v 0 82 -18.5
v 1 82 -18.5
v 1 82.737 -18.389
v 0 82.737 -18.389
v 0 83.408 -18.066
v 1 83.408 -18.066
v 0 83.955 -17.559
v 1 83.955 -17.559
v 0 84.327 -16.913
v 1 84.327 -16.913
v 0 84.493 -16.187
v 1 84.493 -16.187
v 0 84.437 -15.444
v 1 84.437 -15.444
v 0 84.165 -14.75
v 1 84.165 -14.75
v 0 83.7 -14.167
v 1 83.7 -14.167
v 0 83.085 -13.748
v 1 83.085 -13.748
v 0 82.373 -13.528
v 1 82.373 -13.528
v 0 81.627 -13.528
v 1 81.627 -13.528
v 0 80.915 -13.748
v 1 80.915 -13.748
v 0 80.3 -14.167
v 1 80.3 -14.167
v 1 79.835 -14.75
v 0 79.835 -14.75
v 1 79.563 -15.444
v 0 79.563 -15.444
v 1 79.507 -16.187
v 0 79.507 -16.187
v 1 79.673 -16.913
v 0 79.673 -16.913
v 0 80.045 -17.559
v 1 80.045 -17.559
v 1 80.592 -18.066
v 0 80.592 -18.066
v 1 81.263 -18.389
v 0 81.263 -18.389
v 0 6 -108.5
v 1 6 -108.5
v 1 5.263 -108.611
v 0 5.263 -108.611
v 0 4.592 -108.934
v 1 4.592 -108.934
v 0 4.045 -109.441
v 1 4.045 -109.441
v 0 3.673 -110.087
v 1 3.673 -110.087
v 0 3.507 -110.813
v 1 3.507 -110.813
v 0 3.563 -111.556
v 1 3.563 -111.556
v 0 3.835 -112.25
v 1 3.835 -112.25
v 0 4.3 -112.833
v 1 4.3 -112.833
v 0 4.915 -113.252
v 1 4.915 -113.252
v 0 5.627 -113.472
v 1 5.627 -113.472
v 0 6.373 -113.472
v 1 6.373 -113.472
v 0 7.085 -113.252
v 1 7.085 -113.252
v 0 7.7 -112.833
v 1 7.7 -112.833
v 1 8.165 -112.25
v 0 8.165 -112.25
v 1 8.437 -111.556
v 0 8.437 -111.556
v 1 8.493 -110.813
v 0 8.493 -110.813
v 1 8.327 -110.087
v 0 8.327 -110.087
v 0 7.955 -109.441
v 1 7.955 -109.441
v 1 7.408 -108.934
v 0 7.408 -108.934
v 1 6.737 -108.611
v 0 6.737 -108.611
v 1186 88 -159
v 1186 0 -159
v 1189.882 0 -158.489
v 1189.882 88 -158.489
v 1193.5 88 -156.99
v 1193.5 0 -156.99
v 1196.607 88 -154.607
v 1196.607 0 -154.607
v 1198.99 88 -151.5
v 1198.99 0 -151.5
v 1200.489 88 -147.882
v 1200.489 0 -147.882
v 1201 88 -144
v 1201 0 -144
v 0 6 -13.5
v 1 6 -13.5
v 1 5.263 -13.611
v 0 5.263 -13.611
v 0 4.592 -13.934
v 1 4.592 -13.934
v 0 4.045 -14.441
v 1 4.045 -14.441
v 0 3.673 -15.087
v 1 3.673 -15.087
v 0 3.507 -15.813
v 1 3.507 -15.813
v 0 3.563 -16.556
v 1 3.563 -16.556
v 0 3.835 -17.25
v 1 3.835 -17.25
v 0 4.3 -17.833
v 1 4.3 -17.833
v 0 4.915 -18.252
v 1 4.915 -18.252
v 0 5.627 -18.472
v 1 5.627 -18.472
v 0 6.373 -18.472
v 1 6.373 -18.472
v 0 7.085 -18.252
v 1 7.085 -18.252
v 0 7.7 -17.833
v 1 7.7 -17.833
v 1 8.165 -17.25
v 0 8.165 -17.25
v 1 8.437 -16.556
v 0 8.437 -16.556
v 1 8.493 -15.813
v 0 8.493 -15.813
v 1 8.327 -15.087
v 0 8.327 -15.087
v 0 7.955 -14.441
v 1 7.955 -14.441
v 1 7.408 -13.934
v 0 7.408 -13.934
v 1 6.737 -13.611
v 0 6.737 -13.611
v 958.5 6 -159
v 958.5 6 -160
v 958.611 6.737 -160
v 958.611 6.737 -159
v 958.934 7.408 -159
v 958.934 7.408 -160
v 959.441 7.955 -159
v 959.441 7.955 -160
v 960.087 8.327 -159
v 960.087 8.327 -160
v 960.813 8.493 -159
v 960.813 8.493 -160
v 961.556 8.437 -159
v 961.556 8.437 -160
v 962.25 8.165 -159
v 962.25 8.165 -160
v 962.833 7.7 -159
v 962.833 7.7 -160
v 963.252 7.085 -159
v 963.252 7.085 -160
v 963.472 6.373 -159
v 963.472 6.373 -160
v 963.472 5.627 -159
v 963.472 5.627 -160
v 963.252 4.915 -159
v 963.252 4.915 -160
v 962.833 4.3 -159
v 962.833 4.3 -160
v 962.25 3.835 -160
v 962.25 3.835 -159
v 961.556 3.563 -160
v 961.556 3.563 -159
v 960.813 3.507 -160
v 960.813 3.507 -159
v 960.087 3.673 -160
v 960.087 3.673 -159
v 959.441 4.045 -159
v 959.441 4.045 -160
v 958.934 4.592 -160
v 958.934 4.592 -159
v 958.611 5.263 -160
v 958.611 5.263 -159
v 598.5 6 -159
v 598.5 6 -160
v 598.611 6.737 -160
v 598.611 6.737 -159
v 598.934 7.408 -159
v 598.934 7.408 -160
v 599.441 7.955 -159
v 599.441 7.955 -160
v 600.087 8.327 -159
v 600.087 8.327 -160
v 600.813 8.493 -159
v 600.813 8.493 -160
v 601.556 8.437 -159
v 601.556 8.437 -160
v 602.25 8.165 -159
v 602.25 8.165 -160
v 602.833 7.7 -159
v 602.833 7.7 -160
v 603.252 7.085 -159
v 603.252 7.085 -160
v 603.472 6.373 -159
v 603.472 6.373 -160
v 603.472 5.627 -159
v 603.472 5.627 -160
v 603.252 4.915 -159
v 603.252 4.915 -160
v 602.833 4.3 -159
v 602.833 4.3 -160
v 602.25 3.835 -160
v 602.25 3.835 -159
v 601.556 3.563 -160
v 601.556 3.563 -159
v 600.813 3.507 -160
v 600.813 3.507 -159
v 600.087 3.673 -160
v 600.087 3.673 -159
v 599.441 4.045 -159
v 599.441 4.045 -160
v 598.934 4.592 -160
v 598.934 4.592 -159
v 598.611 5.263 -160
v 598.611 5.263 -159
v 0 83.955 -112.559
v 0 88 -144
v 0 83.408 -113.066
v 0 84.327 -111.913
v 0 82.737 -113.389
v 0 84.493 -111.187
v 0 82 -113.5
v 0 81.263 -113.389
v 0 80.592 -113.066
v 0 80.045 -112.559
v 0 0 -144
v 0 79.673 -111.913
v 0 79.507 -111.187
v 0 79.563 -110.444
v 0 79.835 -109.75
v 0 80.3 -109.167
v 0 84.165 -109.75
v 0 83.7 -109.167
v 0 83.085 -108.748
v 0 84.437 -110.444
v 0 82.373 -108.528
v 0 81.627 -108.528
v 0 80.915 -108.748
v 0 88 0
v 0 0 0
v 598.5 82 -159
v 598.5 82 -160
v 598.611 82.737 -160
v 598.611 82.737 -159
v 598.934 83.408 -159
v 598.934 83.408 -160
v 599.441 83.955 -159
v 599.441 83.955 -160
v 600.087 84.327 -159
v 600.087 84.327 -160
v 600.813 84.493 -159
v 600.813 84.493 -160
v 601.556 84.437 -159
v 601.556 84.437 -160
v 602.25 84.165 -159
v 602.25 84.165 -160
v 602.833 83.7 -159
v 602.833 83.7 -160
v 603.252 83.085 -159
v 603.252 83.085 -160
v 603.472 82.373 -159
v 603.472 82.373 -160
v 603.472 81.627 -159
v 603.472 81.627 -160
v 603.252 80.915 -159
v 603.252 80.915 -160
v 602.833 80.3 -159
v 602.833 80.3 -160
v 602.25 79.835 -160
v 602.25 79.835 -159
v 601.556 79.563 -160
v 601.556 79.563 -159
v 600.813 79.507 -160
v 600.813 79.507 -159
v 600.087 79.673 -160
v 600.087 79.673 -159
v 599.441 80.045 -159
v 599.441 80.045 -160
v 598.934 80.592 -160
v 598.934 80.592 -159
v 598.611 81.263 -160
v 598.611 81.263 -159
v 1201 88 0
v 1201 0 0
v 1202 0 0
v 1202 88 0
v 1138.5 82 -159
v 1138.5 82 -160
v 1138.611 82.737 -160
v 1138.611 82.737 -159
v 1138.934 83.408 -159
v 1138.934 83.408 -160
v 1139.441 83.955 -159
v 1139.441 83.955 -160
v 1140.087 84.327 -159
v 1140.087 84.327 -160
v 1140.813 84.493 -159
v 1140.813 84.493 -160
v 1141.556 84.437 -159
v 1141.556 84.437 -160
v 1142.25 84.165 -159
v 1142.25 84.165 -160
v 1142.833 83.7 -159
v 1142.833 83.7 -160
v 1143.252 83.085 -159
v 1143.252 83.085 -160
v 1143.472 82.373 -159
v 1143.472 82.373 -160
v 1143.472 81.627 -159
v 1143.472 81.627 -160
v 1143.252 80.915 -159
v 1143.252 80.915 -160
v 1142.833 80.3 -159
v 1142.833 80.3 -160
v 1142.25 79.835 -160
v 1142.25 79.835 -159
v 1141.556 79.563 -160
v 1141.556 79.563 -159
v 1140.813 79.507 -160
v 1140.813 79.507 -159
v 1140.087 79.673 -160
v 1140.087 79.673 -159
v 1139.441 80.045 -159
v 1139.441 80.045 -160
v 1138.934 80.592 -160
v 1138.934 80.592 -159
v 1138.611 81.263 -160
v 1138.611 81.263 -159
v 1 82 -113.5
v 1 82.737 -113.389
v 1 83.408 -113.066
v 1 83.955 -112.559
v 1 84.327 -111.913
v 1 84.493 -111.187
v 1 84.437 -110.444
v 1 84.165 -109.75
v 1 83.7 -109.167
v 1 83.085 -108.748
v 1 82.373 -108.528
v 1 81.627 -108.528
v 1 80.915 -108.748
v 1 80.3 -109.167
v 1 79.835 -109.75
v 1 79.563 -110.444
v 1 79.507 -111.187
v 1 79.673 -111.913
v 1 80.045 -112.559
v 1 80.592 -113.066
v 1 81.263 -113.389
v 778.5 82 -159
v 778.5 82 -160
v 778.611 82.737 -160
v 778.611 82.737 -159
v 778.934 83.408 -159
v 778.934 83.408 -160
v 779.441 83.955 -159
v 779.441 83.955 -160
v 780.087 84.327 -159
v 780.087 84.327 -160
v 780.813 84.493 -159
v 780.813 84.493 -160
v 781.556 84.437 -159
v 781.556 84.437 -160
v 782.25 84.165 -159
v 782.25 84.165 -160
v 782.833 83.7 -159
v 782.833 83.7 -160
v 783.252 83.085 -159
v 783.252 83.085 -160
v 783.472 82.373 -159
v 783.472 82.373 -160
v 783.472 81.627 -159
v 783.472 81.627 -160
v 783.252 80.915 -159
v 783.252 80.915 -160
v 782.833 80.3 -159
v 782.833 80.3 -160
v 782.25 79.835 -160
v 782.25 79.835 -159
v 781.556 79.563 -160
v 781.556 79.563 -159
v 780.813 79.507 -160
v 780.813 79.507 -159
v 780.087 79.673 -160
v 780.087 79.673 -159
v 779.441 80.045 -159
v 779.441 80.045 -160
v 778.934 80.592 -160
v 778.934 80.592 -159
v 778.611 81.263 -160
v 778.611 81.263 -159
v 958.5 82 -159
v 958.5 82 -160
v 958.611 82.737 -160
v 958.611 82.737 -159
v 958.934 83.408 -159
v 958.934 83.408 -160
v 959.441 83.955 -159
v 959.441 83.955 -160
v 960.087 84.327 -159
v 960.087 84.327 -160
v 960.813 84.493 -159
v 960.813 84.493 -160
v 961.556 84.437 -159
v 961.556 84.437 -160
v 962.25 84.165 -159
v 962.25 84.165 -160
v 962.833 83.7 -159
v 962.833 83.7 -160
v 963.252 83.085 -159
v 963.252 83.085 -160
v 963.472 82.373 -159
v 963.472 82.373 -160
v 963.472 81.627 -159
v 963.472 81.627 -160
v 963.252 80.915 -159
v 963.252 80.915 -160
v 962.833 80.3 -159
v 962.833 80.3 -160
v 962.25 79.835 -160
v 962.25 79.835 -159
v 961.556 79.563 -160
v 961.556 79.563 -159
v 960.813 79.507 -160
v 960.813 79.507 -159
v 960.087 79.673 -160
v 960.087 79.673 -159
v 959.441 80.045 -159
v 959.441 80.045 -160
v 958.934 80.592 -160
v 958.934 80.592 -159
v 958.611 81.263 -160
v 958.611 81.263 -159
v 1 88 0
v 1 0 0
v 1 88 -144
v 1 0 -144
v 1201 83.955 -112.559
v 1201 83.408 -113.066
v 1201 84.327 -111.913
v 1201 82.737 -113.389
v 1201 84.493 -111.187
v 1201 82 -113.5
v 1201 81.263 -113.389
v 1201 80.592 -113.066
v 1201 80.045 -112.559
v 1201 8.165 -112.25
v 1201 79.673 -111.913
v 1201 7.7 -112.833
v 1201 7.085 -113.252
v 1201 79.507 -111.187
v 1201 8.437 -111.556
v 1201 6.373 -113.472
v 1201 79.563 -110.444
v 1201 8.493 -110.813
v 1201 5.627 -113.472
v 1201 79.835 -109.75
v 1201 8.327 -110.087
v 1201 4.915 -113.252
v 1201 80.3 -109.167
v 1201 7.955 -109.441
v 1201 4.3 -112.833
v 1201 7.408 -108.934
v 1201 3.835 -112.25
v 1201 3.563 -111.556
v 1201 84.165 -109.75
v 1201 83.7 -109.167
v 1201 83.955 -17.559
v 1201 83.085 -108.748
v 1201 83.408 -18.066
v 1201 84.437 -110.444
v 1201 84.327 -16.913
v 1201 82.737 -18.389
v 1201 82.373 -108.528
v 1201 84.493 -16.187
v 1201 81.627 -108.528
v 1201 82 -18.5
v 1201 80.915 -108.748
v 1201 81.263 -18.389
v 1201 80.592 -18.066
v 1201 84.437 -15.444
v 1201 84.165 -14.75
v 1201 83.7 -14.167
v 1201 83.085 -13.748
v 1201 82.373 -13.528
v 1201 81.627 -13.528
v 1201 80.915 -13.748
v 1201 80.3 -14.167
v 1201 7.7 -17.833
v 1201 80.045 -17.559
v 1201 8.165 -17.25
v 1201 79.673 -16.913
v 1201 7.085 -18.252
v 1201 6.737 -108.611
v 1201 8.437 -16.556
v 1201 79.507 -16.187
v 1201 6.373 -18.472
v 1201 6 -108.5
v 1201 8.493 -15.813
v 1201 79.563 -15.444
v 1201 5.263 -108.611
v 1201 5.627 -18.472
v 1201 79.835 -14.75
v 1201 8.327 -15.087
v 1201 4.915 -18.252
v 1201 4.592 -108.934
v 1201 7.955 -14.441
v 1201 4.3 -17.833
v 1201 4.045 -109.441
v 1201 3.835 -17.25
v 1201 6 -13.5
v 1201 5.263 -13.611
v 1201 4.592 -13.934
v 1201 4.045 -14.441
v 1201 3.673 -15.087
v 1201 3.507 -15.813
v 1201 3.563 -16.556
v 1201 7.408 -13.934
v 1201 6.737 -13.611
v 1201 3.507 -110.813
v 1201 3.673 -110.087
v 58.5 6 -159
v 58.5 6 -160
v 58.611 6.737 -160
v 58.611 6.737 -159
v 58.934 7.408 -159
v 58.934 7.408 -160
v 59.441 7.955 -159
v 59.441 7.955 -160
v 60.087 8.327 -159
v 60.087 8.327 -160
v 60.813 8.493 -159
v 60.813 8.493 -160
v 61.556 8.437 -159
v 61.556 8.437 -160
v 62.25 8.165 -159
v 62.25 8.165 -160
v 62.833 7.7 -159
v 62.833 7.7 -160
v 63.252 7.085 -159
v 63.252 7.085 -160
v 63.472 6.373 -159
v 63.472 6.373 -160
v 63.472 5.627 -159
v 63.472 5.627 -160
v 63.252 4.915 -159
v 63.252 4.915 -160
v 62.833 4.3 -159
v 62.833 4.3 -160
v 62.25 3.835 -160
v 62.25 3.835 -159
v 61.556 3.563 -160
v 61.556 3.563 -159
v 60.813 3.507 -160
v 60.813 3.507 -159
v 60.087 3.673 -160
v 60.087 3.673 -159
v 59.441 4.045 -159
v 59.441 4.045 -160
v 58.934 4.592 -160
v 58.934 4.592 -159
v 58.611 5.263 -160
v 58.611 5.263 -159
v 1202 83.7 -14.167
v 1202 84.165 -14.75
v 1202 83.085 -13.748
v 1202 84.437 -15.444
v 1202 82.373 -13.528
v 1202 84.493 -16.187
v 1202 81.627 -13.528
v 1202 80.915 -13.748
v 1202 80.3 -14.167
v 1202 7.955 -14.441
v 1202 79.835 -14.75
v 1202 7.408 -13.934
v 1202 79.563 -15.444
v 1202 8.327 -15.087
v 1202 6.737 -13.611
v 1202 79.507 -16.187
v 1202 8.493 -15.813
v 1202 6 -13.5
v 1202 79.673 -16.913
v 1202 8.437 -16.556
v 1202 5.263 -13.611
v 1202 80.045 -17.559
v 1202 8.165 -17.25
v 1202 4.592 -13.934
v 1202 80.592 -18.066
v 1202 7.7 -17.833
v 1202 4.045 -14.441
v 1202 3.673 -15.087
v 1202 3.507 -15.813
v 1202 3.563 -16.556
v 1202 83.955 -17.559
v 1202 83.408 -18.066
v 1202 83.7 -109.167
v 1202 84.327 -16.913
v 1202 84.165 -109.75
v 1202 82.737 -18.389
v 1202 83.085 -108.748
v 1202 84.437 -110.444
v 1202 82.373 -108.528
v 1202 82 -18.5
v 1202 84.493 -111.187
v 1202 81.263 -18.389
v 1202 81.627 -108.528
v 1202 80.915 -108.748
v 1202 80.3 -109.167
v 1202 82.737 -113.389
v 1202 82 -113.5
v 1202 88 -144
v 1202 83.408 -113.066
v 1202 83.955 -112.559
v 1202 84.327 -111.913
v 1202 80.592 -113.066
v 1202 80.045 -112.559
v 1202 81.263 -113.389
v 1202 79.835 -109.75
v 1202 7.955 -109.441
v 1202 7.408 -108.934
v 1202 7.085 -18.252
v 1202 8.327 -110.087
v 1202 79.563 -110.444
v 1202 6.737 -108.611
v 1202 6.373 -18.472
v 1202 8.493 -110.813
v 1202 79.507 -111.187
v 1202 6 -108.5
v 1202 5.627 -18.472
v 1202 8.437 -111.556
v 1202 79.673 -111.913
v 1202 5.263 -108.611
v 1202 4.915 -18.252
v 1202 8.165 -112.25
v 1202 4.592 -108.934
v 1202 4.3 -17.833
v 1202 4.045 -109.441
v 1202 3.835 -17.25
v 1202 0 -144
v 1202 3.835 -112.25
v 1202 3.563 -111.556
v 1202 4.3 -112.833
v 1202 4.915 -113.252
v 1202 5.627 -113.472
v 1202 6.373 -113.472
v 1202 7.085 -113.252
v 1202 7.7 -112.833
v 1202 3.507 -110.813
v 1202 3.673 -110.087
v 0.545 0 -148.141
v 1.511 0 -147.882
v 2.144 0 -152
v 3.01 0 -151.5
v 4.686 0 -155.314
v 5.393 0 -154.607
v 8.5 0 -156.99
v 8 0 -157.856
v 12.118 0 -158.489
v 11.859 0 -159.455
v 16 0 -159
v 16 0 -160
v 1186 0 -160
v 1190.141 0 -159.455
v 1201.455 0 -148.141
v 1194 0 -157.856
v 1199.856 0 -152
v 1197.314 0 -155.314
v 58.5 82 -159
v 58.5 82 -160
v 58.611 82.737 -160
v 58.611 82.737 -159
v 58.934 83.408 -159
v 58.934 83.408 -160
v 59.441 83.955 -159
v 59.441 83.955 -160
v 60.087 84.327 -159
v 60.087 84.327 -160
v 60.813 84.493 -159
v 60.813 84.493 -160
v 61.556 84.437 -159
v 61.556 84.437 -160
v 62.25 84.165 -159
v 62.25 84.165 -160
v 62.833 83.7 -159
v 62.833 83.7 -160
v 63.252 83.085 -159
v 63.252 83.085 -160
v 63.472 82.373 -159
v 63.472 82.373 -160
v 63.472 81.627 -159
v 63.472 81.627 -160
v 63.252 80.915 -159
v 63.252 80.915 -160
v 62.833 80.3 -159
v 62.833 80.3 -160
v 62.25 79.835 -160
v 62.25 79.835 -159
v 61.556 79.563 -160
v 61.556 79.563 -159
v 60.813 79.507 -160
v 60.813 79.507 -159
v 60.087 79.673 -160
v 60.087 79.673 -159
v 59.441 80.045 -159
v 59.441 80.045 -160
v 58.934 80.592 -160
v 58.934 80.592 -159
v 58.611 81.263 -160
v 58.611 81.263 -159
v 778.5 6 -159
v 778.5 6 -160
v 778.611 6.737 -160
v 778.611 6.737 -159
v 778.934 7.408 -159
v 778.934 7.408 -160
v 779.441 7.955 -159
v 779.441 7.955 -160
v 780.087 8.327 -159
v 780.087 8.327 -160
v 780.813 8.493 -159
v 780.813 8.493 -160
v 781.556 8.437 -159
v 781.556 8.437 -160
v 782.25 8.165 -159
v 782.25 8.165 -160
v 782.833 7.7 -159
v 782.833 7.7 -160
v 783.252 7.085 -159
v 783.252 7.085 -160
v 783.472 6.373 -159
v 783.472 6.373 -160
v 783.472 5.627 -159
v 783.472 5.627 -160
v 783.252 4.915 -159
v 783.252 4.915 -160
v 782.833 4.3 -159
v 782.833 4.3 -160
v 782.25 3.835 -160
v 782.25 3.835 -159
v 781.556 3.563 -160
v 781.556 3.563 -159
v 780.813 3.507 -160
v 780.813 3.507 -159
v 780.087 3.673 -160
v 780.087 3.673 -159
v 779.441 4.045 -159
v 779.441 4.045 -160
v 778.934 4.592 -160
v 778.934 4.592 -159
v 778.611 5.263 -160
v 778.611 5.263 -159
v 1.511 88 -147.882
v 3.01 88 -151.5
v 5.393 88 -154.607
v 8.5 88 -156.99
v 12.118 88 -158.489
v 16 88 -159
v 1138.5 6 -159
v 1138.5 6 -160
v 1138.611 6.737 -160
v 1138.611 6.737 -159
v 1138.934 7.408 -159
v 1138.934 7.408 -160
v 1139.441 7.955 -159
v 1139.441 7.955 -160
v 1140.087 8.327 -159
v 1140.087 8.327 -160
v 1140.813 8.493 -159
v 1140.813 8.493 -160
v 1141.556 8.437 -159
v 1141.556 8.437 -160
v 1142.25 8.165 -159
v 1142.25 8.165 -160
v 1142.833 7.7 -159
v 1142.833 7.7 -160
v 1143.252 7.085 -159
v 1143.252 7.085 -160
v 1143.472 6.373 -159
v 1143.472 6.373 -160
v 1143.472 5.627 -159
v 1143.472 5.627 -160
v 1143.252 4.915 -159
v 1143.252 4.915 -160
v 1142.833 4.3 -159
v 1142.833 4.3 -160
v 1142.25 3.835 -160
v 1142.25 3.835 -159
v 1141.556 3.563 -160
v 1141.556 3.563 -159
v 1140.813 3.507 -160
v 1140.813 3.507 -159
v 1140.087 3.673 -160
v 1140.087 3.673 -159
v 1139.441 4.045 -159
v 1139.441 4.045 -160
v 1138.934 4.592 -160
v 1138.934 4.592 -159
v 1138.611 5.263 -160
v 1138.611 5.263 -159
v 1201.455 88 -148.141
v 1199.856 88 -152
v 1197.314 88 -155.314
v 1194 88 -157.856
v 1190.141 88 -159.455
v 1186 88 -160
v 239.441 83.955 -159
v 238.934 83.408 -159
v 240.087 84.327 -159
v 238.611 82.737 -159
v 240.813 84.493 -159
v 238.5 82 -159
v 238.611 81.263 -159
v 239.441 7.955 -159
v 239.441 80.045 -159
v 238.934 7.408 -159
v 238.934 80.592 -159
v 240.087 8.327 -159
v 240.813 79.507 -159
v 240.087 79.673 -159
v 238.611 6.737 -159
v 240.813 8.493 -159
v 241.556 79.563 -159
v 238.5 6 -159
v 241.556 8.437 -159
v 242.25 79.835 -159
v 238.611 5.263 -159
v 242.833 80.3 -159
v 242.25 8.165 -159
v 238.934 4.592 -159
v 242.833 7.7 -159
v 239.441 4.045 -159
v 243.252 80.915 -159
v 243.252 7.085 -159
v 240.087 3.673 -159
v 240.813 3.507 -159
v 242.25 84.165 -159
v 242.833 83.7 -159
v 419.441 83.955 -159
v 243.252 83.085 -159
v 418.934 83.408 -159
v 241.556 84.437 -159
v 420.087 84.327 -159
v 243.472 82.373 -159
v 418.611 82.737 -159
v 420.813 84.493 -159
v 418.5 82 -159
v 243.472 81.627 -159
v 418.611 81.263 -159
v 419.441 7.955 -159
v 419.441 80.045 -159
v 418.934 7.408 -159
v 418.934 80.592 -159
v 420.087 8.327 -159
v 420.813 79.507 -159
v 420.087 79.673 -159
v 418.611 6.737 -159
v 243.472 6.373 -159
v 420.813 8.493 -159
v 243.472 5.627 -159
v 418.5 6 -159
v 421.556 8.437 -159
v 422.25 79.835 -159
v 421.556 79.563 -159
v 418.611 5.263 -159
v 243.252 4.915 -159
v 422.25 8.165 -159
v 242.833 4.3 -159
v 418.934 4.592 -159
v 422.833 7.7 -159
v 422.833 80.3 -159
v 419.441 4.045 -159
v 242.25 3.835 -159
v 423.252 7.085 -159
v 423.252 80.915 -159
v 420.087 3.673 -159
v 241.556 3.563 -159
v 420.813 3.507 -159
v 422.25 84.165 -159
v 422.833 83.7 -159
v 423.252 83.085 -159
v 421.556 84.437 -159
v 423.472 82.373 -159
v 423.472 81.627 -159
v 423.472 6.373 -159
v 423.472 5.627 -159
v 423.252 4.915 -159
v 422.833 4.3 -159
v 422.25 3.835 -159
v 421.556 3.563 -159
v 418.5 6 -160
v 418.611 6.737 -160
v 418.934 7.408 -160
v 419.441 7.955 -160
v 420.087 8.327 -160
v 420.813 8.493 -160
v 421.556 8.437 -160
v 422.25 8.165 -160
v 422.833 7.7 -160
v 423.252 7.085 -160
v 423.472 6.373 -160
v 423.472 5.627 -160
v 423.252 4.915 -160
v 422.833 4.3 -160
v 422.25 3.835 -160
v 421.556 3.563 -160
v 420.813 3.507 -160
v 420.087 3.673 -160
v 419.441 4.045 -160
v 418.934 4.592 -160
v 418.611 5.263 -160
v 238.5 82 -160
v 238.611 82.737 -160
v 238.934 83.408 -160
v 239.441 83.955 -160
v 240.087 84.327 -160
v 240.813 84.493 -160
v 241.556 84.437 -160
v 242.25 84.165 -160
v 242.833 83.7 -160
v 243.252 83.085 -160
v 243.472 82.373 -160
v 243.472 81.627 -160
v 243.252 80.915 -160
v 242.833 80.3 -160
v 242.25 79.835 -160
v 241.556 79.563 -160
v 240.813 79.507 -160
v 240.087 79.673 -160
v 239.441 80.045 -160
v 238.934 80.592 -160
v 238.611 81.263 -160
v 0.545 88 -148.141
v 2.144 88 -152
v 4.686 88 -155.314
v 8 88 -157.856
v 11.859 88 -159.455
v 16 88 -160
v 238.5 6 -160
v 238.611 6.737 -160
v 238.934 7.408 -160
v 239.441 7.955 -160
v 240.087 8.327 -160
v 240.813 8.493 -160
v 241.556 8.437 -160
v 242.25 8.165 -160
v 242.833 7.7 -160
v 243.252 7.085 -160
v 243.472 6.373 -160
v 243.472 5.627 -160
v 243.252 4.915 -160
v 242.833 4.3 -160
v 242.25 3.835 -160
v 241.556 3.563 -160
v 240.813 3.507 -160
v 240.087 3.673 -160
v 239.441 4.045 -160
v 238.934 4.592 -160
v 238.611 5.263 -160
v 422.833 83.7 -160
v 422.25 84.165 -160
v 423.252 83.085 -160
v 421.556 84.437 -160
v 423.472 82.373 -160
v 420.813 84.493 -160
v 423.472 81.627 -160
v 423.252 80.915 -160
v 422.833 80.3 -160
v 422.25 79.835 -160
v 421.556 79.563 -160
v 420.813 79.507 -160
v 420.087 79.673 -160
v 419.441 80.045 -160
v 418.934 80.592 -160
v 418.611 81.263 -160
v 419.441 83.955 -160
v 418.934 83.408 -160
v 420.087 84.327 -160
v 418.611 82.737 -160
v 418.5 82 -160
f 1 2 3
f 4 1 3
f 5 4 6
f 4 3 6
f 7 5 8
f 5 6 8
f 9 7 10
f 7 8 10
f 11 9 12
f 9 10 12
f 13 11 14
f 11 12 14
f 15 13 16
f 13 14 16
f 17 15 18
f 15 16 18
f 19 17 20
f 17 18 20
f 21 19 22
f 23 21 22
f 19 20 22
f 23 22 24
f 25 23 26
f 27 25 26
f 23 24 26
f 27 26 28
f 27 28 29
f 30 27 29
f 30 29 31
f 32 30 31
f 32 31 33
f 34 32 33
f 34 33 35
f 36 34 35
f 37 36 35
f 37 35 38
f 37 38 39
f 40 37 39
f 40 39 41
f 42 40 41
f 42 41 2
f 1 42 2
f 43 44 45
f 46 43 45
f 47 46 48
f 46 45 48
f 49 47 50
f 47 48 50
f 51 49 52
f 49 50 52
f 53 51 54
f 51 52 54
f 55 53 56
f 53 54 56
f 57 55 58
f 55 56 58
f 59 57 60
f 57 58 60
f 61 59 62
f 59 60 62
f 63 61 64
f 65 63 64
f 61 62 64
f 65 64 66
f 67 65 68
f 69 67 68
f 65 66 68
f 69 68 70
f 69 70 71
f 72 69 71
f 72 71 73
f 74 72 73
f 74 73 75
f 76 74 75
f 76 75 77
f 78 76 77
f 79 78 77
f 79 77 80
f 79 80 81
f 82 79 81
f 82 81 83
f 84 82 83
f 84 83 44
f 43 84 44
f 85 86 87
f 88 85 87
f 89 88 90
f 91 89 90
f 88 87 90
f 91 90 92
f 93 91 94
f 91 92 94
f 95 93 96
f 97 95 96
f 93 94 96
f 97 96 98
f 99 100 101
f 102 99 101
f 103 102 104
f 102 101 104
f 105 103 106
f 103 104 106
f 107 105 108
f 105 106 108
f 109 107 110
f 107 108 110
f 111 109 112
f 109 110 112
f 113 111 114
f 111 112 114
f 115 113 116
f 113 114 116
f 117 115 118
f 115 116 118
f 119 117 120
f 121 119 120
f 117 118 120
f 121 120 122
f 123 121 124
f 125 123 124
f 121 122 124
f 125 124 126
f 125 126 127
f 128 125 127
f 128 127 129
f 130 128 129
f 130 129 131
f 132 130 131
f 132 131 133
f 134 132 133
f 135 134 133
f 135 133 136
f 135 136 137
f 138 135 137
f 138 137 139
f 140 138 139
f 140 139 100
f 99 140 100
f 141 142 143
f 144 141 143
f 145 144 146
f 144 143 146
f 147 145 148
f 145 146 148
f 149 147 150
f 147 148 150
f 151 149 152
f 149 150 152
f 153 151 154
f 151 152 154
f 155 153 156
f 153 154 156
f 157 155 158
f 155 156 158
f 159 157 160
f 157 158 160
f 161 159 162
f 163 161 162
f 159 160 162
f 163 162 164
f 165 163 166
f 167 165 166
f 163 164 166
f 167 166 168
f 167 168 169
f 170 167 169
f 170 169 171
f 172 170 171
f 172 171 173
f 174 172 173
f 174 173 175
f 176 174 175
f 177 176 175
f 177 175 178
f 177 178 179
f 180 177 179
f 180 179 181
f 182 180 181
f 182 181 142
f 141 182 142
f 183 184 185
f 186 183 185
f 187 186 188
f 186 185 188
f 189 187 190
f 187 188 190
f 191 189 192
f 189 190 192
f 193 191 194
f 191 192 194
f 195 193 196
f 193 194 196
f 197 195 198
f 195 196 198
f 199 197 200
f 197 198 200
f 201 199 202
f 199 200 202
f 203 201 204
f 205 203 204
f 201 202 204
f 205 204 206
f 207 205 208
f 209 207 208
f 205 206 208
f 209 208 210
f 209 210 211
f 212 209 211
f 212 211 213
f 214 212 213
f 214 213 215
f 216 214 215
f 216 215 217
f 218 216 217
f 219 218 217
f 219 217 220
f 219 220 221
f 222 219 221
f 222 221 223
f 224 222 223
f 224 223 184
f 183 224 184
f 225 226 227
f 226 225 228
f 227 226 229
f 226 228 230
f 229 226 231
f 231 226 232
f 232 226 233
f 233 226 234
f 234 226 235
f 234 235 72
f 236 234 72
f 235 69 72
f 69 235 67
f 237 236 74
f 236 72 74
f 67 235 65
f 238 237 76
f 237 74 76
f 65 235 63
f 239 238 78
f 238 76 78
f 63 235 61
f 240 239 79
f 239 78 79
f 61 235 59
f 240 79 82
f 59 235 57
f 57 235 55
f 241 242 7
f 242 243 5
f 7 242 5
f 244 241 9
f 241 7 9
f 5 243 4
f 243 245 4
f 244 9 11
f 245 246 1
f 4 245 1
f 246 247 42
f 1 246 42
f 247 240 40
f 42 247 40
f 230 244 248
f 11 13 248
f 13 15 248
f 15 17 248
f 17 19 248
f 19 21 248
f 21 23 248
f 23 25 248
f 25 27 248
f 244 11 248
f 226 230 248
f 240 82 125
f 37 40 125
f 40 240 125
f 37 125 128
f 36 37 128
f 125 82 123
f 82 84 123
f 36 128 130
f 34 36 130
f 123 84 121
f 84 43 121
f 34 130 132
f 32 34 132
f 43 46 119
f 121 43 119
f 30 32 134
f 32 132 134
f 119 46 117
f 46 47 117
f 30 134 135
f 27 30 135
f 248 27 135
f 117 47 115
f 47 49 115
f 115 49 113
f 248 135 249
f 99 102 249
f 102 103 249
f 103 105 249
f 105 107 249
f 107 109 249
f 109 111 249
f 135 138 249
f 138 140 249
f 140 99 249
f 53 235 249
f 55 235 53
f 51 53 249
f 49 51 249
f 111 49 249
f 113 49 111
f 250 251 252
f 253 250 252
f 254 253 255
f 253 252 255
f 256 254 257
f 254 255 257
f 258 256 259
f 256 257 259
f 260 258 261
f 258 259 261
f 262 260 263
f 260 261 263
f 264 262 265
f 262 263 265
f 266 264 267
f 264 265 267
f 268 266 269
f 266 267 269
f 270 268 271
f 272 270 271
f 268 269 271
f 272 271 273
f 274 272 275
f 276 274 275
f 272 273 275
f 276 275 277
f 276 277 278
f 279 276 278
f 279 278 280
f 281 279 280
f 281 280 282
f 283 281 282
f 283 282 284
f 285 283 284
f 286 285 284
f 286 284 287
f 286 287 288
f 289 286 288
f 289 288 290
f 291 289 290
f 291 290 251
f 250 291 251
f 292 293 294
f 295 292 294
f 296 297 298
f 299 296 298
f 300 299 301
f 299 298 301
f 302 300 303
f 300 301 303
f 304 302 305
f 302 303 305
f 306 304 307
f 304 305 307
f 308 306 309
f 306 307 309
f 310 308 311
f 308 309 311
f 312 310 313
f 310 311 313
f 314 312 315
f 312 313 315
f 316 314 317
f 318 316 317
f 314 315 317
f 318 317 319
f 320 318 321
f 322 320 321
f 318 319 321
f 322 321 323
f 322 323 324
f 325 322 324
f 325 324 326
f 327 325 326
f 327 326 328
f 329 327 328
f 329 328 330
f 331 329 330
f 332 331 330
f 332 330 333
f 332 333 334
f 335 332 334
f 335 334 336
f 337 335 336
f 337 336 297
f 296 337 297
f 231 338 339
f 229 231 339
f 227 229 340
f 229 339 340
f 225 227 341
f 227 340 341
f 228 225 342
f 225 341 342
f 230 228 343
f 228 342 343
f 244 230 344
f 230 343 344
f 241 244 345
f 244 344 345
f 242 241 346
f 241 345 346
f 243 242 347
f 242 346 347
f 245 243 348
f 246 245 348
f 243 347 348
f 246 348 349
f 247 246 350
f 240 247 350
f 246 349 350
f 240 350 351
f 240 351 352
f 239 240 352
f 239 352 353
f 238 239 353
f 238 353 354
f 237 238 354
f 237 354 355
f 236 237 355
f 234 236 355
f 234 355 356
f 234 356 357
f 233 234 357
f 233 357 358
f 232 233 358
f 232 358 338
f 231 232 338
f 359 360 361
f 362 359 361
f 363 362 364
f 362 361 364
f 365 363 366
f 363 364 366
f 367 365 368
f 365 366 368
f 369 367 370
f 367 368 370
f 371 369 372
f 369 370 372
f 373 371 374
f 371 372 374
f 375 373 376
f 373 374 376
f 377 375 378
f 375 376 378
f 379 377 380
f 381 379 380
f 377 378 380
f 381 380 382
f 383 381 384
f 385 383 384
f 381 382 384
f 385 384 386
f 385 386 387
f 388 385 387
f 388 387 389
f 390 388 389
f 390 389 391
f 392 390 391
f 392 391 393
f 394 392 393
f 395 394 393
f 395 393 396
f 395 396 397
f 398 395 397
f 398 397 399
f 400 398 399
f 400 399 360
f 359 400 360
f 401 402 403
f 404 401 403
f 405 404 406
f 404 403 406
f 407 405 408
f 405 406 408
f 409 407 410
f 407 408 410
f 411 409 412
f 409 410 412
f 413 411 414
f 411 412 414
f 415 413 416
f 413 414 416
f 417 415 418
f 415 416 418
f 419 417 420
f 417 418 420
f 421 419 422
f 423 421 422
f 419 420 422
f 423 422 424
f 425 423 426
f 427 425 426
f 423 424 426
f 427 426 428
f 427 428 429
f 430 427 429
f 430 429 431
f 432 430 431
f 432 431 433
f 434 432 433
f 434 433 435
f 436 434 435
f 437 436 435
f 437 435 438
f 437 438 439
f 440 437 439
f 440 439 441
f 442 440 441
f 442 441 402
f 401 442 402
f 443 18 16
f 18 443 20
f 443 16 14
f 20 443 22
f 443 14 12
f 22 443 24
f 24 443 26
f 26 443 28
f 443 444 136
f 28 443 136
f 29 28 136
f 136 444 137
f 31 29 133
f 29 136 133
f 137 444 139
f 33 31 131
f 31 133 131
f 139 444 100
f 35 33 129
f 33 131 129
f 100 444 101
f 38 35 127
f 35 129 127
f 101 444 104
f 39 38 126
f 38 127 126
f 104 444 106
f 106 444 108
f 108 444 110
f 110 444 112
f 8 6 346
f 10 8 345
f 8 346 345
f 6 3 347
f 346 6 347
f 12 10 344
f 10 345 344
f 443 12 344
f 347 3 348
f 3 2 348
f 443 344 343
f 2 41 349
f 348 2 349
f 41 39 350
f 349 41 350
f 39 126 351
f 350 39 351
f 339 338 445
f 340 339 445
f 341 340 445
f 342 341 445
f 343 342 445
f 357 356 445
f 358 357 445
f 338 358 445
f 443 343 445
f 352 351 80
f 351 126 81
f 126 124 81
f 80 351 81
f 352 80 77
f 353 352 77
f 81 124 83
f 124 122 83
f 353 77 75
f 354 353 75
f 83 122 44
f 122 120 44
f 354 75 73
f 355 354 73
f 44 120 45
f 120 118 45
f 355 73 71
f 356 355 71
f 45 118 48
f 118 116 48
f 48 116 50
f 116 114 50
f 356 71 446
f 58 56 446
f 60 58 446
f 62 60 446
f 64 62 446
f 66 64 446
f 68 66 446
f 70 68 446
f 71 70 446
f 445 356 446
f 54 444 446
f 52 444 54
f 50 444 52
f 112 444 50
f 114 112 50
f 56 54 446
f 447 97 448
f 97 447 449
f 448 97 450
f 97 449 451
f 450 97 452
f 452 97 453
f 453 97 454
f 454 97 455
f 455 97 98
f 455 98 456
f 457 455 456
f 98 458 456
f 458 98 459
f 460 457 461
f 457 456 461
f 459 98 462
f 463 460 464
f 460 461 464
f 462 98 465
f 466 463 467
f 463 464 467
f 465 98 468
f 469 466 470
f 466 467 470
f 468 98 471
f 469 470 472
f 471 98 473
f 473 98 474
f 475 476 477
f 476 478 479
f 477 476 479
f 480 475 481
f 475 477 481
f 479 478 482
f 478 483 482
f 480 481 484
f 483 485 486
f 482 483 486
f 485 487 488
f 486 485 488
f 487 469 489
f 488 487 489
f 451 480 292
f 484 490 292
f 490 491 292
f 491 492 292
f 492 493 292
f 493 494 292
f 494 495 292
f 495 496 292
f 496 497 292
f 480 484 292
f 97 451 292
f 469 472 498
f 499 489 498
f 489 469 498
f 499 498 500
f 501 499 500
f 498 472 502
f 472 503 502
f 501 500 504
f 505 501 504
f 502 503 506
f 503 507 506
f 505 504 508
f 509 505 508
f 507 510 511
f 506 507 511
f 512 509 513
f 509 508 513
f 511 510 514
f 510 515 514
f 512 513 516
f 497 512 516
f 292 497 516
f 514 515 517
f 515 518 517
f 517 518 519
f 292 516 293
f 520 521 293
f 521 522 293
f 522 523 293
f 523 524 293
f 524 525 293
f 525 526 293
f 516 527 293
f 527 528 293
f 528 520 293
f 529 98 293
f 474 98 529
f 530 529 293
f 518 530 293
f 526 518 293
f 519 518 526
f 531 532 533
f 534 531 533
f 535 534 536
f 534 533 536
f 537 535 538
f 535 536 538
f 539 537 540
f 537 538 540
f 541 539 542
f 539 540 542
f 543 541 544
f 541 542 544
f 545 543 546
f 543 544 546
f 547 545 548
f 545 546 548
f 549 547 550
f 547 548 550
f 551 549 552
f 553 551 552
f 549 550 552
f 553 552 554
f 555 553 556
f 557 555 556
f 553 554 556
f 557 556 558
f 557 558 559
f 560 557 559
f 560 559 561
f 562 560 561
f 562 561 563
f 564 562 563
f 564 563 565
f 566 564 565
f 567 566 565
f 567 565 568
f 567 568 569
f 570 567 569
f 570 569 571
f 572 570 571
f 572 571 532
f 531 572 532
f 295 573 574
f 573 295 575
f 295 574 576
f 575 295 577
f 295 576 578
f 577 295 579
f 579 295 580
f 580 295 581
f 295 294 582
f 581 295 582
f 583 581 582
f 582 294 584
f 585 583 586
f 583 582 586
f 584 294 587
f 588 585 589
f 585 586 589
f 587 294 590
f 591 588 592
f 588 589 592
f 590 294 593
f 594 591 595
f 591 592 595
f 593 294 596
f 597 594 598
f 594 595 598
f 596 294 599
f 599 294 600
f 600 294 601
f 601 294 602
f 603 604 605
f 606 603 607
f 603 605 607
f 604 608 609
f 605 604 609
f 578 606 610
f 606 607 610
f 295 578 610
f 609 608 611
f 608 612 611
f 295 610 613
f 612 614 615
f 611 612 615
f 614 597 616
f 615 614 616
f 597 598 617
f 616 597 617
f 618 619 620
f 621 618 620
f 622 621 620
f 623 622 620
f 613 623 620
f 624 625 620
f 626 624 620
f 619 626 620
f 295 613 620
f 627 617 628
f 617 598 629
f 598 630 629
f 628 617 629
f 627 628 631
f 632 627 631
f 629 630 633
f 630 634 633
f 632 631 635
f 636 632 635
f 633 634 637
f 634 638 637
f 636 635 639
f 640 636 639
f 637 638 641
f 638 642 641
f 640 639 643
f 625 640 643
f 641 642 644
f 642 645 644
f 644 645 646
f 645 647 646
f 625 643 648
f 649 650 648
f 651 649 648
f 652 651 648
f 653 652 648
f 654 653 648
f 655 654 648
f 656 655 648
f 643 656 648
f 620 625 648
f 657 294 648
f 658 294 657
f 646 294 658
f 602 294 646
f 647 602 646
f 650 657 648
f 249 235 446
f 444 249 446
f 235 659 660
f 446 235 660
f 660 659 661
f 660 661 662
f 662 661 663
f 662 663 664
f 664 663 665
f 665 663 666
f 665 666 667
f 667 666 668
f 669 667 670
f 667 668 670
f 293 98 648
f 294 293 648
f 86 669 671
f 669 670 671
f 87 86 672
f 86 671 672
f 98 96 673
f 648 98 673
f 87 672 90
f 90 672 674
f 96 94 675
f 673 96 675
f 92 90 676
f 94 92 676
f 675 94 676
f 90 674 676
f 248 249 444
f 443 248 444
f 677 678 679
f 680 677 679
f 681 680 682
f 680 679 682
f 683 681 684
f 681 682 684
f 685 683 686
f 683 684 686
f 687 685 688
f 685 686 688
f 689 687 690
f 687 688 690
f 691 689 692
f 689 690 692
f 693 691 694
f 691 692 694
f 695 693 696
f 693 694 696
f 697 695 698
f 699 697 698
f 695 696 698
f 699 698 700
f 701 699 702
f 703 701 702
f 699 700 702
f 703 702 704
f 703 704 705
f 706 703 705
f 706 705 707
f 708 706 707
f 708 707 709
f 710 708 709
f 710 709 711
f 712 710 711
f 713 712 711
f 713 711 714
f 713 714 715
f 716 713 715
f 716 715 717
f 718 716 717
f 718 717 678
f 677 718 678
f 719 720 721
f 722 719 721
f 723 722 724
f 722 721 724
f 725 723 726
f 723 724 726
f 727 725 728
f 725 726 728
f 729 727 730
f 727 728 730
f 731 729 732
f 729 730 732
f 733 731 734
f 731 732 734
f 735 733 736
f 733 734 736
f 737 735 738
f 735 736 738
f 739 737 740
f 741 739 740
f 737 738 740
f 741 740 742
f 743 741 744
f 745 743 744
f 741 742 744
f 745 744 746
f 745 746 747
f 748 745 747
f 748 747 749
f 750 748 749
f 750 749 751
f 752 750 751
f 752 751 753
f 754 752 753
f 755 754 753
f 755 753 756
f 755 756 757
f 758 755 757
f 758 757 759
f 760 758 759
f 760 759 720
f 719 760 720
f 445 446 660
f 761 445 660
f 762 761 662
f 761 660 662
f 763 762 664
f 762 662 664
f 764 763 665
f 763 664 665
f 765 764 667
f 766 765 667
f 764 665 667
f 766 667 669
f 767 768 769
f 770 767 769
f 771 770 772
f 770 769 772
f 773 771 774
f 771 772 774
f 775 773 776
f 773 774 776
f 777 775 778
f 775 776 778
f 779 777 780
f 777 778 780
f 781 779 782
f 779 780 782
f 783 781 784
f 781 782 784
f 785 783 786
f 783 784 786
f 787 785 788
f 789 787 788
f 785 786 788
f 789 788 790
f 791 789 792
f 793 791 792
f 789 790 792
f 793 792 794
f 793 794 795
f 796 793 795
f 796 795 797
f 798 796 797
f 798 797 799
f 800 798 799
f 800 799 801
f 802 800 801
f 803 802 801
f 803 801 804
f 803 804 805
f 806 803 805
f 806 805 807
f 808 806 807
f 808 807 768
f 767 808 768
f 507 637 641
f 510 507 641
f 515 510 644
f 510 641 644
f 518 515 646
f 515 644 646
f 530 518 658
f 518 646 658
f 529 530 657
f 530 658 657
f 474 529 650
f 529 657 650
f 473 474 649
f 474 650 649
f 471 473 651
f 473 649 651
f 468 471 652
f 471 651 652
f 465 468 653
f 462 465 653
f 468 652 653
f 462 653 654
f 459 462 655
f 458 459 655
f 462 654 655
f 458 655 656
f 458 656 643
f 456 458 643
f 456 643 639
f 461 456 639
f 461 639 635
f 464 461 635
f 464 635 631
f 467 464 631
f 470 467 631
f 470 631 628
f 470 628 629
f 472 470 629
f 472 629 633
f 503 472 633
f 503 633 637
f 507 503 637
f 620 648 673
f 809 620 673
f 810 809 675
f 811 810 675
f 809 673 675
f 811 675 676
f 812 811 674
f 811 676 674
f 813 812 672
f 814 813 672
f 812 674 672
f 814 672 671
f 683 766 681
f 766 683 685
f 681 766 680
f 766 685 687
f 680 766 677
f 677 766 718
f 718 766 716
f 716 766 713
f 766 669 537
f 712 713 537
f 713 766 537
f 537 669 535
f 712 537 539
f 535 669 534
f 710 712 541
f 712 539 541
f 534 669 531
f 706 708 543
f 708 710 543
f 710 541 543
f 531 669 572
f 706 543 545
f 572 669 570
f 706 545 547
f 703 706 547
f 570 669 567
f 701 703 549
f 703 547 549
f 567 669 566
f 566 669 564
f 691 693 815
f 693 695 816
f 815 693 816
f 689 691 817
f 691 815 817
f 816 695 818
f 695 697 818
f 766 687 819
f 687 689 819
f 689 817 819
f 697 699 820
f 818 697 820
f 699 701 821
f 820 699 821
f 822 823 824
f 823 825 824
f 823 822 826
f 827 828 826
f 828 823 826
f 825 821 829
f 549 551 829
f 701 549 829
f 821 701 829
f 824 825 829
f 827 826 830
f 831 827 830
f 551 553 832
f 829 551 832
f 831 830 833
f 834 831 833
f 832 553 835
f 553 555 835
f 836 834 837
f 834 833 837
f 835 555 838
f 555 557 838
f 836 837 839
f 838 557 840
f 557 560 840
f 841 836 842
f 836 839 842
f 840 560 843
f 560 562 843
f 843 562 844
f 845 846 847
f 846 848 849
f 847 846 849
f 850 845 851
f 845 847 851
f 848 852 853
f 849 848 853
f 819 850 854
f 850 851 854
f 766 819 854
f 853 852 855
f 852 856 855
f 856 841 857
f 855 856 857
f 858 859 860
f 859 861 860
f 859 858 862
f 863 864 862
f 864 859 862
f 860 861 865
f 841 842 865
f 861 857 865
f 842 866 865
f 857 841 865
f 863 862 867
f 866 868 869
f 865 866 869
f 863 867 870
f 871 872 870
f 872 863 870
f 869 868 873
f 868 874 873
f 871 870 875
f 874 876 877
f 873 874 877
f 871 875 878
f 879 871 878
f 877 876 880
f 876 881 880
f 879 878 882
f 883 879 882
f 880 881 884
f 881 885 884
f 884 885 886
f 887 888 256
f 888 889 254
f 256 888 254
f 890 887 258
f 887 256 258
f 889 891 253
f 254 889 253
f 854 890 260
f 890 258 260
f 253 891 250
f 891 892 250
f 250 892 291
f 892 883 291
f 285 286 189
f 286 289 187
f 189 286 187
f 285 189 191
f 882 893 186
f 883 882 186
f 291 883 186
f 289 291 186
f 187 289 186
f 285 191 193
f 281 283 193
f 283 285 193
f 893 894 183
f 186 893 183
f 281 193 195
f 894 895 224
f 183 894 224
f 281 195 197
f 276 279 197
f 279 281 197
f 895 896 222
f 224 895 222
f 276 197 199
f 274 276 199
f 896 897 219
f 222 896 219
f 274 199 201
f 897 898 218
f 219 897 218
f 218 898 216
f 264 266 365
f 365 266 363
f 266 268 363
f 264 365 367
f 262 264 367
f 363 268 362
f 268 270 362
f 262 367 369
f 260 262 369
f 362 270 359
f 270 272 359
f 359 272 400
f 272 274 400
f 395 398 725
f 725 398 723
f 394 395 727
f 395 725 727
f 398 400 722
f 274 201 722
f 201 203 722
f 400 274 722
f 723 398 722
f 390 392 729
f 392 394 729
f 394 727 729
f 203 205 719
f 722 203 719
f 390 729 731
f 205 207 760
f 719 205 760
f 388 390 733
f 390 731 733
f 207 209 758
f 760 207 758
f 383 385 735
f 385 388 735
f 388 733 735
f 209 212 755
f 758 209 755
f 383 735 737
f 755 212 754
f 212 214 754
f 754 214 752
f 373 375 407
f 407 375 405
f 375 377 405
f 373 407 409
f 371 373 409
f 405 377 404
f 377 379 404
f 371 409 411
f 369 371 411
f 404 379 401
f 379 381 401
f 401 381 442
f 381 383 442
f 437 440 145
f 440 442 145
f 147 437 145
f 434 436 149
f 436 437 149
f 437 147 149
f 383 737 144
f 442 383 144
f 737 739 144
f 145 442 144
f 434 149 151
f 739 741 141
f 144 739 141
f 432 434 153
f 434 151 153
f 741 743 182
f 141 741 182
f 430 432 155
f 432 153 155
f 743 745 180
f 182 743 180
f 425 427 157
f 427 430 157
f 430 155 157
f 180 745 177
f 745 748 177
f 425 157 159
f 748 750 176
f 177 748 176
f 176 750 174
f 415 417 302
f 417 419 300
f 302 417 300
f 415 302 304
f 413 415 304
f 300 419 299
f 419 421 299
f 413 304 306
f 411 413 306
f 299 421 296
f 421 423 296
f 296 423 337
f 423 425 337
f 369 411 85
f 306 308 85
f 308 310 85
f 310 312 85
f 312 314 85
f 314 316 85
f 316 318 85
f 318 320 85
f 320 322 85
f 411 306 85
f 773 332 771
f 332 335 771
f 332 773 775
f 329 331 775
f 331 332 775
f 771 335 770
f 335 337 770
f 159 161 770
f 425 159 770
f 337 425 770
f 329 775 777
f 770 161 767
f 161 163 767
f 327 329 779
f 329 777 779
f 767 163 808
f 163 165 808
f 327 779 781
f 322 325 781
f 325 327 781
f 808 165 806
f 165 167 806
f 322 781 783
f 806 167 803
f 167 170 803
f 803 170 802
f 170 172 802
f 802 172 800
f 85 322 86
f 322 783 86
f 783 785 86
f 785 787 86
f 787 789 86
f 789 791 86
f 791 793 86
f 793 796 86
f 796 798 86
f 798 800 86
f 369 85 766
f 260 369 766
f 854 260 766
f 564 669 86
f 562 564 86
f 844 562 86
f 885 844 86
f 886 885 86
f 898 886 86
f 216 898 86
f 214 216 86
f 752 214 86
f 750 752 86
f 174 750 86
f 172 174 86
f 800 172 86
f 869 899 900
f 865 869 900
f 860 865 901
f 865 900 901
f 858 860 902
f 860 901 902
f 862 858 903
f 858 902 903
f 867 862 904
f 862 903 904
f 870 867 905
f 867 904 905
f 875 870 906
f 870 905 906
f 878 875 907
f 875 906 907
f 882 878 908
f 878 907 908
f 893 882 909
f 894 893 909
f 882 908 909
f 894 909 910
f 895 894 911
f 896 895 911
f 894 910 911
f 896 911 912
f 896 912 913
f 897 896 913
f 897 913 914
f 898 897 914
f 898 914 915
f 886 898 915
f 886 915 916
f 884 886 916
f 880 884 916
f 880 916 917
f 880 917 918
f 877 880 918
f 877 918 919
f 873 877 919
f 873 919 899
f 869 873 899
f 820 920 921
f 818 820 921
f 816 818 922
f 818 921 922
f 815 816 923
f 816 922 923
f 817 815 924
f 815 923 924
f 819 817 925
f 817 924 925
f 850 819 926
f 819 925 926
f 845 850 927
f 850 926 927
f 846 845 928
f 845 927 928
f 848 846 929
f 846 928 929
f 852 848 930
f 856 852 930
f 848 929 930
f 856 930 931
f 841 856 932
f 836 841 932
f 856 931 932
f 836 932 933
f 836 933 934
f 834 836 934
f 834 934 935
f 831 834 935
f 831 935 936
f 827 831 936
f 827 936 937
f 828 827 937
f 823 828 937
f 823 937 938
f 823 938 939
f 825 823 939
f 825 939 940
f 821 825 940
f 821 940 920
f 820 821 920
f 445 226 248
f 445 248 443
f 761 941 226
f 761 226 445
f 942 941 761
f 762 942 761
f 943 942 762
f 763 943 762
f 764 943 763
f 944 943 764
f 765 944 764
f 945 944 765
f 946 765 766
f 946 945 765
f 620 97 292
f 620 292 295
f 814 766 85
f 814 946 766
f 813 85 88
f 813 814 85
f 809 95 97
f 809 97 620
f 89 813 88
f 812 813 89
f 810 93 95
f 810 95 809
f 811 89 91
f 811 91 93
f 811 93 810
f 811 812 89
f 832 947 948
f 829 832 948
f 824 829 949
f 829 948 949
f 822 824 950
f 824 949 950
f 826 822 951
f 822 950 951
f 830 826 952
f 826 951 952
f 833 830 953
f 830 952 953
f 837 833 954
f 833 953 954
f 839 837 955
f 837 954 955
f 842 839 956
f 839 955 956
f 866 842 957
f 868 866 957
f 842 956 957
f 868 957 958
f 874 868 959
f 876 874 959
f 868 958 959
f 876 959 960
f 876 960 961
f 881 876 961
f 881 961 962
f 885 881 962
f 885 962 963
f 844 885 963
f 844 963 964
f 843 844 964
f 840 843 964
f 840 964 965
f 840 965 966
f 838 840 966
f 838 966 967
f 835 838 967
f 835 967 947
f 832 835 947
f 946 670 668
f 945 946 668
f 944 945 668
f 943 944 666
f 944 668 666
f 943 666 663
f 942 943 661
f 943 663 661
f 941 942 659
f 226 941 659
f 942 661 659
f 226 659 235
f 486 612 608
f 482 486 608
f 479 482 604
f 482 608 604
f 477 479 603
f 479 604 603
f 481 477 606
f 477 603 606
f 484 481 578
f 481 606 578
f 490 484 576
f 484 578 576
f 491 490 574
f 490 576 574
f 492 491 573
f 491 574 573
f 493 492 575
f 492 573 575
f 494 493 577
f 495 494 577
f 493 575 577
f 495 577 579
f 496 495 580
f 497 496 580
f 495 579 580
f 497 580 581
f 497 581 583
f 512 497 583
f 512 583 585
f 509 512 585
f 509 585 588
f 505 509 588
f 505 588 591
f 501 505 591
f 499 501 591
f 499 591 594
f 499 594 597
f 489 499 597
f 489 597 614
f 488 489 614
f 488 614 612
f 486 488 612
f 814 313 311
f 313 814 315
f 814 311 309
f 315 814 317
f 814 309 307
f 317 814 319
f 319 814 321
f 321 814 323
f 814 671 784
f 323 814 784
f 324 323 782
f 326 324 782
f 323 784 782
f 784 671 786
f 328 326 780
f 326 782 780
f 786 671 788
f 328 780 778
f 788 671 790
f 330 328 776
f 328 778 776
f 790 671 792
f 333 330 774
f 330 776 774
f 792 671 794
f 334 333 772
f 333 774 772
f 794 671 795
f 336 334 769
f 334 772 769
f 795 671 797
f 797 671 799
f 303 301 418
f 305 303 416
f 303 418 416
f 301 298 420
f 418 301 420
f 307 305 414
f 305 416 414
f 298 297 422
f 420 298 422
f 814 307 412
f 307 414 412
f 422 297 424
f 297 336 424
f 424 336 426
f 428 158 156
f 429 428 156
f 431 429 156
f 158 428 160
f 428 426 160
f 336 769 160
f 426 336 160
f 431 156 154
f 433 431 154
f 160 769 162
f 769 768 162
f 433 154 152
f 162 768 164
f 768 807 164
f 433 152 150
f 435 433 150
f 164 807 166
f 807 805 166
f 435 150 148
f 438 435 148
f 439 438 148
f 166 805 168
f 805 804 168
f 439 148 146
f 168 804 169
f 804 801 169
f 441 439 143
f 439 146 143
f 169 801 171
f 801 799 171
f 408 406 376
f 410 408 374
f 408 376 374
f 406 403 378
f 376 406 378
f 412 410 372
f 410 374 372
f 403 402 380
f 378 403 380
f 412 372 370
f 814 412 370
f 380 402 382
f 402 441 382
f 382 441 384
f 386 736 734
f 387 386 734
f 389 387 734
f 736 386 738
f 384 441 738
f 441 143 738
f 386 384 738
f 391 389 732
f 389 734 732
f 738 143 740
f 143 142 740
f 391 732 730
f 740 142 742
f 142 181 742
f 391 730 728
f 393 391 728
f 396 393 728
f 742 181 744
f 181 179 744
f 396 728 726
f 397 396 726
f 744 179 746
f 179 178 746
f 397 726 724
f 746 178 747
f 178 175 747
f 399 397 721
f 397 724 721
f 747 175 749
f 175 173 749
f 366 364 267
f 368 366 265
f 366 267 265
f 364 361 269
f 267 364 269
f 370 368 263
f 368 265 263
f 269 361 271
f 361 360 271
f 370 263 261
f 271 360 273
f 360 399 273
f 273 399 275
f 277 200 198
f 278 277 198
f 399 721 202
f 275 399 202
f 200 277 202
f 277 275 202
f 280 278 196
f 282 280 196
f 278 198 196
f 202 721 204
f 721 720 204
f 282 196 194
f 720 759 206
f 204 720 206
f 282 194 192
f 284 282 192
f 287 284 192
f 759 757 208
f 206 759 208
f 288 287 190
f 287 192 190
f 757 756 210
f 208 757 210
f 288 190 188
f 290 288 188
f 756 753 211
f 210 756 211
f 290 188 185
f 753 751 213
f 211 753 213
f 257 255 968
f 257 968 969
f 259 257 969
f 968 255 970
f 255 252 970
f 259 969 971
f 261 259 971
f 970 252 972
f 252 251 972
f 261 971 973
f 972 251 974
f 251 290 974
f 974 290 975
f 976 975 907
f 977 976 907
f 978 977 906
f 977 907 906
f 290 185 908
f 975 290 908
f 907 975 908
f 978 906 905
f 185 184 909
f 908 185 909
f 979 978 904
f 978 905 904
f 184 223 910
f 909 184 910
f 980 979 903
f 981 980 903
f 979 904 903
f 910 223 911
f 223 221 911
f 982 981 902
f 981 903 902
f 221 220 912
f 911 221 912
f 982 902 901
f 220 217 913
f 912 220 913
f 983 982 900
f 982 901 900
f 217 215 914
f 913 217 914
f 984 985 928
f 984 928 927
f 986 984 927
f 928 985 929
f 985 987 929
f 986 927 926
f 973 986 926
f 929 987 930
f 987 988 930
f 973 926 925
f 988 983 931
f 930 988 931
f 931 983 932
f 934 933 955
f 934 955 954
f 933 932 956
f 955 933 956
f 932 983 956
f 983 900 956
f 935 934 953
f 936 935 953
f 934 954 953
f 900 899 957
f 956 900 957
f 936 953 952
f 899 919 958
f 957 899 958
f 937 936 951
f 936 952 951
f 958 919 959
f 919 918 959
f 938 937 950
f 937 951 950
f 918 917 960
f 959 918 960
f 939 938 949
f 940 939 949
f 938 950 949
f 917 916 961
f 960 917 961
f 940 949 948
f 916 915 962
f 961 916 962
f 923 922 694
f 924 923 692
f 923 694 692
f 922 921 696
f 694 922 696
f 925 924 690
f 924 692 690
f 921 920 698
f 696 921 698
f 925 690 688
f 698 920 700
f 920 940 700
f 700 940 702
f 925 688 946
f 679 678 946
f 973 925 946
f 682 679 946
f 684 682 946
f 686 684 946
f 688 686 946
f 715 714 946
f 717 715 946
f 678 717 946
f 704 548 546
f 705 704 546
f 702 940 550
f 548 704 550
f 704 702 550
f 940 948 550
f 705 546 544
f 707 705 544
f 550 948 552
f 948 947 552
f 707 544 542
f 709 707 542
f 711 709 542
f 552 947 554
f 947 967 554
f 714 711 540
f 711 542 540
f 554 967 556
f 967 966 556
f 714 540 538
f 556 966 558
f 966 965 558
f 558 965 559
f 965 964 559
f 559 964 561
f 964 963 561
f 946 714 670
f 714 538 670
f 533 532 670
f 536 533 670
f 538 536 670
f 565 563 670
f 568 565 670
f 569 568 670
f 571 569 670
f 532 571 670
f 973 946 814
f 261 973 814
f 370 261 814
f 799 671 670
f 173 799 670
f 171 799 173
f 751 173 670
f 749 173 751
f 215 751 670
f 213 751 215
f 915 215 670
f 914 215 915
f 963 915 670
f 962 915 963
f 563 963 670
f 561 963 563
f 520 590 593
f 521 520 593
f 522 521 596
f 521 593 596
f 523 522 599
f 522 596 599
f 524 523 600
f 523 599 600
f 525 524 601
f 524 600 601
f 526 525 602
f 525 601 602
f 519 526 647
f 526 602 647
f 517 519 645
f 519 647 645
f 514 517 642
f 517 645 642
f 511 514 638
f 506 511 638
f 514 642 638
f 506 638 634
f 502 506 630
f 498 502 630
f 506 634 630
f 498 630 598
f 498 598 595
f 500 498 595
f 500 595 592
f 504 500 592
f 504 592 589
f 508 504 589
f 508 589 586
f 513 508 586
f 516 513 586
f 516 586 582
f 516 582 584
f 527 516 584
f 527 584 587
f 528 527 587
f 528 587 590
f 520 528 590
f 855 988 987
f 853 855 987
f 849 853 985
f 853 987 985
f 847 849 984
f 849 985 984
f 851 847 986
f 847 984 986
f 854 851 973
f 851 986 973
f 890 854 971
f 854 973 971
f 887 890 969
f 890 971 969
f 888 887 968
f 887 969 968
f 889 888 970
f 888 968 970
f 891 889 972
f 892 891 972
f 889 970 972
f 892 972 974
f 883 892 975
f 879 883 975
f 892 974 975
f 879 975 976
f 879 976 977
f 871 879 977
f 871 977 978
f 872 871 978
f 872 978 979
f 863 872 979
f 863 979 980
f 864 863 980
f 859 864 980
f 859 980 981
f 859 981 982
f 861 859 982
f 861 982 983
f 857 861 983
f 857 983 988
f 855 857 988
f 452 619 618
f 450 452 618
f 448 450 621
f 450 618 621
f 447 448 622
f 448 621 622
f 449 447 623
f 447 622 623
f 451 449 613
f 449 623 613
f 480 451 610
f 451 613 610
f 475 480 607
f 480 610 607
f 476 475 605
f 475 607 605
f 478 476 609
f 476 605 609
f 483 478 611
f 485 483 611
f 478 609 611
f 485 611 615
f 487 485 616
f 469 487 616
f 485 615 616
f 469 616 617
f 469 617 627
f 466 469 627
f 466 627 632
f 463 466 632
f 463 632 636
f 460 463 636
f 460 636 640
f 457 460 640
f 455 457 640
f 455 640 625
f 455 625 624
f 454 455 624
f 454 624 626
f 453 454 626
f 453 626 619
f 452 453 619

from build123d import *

# Parameters (mm, degrees)
BASE_FLANGE1_DEPTH = 88
SKETCH2_R          = 2.5
CUT_EXTRUDE1_DEPTH = 1216.791100477
SKETCH3_R          = 2.5
CUT_EXTRUDE2_DEPTH = 10


# Read off the part's stored shape, not the designer's step: Base-Flange1
with BuildPart() as part:
    # Base-Flange1 outline → Base-Flange1 (new body)
    with BuildSketch(Plane(origin=(0, 0, 0), x_dir=(1, 0, 0), z_dir=(0, 1, 0))):
        with BuildLine():
            Line((1201, 144), (1201, 0))
            Line((1201, 0), (1202, 0))
            Line((1202, 0), (1202, 144))
            ThreePointArc((1202, 144), (1197.313708499, 155.313708499), (1186, 160))
            Line((1186, 160), (16, 160))
            ThreePointArc((16, 160), (4.686291501, 155.313708499), (0, 144))
            Line((0, 144), (0, 0))
            Line((0, 0), (1, 0))
            Line((1, 0), (1, 144))
            ThreePointArc((1, 144), (5.393398282, 154.606601718), (16, 159))
            Line((16, 159), (1186, 159))
            ThreePointArc((1186, 159), (1196.606601718, 154.606601718), (1201, 144))
        make_face()
    extrude(amount=BASE_FLANGE1_DEPTH)

    # Sketch2 → Cut-Extrude1 (cut, through all)
    with BuildSketch(Plane(origin=(1202, 0, 0), x_dir=(0, 0, -1), z_dir=(1, 0, 0))):
        with Locations((16, 82)):
            Circle(SKETCH2_R)
        with Locations((111, 82)):
            Circle(SKETCH2_R)
        with Locations(Location((111, 6, 0), (0, 0, 180))):
            Circle(SKETCH2_R)
        with Locations(Location((16, 6, 0), (0, 0, 180))):
            Circle(SKETCH2_R)
    extrude(amount=-CUT_EXTRUDE1_DEPTH, mode=Mode.SUBTRACT)

    # Sketch3 → Cut-Extrude2 (cut)
    with BuildSketch(Plane(origin=(0, 0, -160), x_dir=(-1, 0, 0), z_dir=(0, 0, -1))):
        with Locations((-1141, 82)):
            Circle(SKETCH3_R)
        with Locations((-961, 82)):
            Circle(SKETCH3_R)
        with Locations((-781, 82)):
            Circle(SKETCH3_R)
        with Locations((-601, 82)):
            Circle(SKETCH3_R)
        with Locations((-421, 82)):
            Circle(SKETCH3_R)
        with Locations((-241, 82)):
            Circle(SKETCH3_R)
        with Locations((-61, 82)):
            Circle(SKETCH3_R)
        with Locations((-961, 6)):
            Circle(SKETCH3_R)
        with Locations((-781, 6)):
            Circle(SKETCH3_R)
        with Locations((-601, 6)):
            Circle(SKETCH3_R)
        with Locations((-421, 6)):
            Circle(SKETCH3_R)
        with Locations((-241, 6)):
            Circle(SKETCH3_R)
        with Locations((-61, 6)):
            Circle(SKETCH3_R)
        with Locations((-1141, 6)):
            Circle(SKETCH3_R)
    extrude(amount=-CUT_EXTRUDE2_DEPTH, mode=Mode.SUBTRACT)


solid = part.part
